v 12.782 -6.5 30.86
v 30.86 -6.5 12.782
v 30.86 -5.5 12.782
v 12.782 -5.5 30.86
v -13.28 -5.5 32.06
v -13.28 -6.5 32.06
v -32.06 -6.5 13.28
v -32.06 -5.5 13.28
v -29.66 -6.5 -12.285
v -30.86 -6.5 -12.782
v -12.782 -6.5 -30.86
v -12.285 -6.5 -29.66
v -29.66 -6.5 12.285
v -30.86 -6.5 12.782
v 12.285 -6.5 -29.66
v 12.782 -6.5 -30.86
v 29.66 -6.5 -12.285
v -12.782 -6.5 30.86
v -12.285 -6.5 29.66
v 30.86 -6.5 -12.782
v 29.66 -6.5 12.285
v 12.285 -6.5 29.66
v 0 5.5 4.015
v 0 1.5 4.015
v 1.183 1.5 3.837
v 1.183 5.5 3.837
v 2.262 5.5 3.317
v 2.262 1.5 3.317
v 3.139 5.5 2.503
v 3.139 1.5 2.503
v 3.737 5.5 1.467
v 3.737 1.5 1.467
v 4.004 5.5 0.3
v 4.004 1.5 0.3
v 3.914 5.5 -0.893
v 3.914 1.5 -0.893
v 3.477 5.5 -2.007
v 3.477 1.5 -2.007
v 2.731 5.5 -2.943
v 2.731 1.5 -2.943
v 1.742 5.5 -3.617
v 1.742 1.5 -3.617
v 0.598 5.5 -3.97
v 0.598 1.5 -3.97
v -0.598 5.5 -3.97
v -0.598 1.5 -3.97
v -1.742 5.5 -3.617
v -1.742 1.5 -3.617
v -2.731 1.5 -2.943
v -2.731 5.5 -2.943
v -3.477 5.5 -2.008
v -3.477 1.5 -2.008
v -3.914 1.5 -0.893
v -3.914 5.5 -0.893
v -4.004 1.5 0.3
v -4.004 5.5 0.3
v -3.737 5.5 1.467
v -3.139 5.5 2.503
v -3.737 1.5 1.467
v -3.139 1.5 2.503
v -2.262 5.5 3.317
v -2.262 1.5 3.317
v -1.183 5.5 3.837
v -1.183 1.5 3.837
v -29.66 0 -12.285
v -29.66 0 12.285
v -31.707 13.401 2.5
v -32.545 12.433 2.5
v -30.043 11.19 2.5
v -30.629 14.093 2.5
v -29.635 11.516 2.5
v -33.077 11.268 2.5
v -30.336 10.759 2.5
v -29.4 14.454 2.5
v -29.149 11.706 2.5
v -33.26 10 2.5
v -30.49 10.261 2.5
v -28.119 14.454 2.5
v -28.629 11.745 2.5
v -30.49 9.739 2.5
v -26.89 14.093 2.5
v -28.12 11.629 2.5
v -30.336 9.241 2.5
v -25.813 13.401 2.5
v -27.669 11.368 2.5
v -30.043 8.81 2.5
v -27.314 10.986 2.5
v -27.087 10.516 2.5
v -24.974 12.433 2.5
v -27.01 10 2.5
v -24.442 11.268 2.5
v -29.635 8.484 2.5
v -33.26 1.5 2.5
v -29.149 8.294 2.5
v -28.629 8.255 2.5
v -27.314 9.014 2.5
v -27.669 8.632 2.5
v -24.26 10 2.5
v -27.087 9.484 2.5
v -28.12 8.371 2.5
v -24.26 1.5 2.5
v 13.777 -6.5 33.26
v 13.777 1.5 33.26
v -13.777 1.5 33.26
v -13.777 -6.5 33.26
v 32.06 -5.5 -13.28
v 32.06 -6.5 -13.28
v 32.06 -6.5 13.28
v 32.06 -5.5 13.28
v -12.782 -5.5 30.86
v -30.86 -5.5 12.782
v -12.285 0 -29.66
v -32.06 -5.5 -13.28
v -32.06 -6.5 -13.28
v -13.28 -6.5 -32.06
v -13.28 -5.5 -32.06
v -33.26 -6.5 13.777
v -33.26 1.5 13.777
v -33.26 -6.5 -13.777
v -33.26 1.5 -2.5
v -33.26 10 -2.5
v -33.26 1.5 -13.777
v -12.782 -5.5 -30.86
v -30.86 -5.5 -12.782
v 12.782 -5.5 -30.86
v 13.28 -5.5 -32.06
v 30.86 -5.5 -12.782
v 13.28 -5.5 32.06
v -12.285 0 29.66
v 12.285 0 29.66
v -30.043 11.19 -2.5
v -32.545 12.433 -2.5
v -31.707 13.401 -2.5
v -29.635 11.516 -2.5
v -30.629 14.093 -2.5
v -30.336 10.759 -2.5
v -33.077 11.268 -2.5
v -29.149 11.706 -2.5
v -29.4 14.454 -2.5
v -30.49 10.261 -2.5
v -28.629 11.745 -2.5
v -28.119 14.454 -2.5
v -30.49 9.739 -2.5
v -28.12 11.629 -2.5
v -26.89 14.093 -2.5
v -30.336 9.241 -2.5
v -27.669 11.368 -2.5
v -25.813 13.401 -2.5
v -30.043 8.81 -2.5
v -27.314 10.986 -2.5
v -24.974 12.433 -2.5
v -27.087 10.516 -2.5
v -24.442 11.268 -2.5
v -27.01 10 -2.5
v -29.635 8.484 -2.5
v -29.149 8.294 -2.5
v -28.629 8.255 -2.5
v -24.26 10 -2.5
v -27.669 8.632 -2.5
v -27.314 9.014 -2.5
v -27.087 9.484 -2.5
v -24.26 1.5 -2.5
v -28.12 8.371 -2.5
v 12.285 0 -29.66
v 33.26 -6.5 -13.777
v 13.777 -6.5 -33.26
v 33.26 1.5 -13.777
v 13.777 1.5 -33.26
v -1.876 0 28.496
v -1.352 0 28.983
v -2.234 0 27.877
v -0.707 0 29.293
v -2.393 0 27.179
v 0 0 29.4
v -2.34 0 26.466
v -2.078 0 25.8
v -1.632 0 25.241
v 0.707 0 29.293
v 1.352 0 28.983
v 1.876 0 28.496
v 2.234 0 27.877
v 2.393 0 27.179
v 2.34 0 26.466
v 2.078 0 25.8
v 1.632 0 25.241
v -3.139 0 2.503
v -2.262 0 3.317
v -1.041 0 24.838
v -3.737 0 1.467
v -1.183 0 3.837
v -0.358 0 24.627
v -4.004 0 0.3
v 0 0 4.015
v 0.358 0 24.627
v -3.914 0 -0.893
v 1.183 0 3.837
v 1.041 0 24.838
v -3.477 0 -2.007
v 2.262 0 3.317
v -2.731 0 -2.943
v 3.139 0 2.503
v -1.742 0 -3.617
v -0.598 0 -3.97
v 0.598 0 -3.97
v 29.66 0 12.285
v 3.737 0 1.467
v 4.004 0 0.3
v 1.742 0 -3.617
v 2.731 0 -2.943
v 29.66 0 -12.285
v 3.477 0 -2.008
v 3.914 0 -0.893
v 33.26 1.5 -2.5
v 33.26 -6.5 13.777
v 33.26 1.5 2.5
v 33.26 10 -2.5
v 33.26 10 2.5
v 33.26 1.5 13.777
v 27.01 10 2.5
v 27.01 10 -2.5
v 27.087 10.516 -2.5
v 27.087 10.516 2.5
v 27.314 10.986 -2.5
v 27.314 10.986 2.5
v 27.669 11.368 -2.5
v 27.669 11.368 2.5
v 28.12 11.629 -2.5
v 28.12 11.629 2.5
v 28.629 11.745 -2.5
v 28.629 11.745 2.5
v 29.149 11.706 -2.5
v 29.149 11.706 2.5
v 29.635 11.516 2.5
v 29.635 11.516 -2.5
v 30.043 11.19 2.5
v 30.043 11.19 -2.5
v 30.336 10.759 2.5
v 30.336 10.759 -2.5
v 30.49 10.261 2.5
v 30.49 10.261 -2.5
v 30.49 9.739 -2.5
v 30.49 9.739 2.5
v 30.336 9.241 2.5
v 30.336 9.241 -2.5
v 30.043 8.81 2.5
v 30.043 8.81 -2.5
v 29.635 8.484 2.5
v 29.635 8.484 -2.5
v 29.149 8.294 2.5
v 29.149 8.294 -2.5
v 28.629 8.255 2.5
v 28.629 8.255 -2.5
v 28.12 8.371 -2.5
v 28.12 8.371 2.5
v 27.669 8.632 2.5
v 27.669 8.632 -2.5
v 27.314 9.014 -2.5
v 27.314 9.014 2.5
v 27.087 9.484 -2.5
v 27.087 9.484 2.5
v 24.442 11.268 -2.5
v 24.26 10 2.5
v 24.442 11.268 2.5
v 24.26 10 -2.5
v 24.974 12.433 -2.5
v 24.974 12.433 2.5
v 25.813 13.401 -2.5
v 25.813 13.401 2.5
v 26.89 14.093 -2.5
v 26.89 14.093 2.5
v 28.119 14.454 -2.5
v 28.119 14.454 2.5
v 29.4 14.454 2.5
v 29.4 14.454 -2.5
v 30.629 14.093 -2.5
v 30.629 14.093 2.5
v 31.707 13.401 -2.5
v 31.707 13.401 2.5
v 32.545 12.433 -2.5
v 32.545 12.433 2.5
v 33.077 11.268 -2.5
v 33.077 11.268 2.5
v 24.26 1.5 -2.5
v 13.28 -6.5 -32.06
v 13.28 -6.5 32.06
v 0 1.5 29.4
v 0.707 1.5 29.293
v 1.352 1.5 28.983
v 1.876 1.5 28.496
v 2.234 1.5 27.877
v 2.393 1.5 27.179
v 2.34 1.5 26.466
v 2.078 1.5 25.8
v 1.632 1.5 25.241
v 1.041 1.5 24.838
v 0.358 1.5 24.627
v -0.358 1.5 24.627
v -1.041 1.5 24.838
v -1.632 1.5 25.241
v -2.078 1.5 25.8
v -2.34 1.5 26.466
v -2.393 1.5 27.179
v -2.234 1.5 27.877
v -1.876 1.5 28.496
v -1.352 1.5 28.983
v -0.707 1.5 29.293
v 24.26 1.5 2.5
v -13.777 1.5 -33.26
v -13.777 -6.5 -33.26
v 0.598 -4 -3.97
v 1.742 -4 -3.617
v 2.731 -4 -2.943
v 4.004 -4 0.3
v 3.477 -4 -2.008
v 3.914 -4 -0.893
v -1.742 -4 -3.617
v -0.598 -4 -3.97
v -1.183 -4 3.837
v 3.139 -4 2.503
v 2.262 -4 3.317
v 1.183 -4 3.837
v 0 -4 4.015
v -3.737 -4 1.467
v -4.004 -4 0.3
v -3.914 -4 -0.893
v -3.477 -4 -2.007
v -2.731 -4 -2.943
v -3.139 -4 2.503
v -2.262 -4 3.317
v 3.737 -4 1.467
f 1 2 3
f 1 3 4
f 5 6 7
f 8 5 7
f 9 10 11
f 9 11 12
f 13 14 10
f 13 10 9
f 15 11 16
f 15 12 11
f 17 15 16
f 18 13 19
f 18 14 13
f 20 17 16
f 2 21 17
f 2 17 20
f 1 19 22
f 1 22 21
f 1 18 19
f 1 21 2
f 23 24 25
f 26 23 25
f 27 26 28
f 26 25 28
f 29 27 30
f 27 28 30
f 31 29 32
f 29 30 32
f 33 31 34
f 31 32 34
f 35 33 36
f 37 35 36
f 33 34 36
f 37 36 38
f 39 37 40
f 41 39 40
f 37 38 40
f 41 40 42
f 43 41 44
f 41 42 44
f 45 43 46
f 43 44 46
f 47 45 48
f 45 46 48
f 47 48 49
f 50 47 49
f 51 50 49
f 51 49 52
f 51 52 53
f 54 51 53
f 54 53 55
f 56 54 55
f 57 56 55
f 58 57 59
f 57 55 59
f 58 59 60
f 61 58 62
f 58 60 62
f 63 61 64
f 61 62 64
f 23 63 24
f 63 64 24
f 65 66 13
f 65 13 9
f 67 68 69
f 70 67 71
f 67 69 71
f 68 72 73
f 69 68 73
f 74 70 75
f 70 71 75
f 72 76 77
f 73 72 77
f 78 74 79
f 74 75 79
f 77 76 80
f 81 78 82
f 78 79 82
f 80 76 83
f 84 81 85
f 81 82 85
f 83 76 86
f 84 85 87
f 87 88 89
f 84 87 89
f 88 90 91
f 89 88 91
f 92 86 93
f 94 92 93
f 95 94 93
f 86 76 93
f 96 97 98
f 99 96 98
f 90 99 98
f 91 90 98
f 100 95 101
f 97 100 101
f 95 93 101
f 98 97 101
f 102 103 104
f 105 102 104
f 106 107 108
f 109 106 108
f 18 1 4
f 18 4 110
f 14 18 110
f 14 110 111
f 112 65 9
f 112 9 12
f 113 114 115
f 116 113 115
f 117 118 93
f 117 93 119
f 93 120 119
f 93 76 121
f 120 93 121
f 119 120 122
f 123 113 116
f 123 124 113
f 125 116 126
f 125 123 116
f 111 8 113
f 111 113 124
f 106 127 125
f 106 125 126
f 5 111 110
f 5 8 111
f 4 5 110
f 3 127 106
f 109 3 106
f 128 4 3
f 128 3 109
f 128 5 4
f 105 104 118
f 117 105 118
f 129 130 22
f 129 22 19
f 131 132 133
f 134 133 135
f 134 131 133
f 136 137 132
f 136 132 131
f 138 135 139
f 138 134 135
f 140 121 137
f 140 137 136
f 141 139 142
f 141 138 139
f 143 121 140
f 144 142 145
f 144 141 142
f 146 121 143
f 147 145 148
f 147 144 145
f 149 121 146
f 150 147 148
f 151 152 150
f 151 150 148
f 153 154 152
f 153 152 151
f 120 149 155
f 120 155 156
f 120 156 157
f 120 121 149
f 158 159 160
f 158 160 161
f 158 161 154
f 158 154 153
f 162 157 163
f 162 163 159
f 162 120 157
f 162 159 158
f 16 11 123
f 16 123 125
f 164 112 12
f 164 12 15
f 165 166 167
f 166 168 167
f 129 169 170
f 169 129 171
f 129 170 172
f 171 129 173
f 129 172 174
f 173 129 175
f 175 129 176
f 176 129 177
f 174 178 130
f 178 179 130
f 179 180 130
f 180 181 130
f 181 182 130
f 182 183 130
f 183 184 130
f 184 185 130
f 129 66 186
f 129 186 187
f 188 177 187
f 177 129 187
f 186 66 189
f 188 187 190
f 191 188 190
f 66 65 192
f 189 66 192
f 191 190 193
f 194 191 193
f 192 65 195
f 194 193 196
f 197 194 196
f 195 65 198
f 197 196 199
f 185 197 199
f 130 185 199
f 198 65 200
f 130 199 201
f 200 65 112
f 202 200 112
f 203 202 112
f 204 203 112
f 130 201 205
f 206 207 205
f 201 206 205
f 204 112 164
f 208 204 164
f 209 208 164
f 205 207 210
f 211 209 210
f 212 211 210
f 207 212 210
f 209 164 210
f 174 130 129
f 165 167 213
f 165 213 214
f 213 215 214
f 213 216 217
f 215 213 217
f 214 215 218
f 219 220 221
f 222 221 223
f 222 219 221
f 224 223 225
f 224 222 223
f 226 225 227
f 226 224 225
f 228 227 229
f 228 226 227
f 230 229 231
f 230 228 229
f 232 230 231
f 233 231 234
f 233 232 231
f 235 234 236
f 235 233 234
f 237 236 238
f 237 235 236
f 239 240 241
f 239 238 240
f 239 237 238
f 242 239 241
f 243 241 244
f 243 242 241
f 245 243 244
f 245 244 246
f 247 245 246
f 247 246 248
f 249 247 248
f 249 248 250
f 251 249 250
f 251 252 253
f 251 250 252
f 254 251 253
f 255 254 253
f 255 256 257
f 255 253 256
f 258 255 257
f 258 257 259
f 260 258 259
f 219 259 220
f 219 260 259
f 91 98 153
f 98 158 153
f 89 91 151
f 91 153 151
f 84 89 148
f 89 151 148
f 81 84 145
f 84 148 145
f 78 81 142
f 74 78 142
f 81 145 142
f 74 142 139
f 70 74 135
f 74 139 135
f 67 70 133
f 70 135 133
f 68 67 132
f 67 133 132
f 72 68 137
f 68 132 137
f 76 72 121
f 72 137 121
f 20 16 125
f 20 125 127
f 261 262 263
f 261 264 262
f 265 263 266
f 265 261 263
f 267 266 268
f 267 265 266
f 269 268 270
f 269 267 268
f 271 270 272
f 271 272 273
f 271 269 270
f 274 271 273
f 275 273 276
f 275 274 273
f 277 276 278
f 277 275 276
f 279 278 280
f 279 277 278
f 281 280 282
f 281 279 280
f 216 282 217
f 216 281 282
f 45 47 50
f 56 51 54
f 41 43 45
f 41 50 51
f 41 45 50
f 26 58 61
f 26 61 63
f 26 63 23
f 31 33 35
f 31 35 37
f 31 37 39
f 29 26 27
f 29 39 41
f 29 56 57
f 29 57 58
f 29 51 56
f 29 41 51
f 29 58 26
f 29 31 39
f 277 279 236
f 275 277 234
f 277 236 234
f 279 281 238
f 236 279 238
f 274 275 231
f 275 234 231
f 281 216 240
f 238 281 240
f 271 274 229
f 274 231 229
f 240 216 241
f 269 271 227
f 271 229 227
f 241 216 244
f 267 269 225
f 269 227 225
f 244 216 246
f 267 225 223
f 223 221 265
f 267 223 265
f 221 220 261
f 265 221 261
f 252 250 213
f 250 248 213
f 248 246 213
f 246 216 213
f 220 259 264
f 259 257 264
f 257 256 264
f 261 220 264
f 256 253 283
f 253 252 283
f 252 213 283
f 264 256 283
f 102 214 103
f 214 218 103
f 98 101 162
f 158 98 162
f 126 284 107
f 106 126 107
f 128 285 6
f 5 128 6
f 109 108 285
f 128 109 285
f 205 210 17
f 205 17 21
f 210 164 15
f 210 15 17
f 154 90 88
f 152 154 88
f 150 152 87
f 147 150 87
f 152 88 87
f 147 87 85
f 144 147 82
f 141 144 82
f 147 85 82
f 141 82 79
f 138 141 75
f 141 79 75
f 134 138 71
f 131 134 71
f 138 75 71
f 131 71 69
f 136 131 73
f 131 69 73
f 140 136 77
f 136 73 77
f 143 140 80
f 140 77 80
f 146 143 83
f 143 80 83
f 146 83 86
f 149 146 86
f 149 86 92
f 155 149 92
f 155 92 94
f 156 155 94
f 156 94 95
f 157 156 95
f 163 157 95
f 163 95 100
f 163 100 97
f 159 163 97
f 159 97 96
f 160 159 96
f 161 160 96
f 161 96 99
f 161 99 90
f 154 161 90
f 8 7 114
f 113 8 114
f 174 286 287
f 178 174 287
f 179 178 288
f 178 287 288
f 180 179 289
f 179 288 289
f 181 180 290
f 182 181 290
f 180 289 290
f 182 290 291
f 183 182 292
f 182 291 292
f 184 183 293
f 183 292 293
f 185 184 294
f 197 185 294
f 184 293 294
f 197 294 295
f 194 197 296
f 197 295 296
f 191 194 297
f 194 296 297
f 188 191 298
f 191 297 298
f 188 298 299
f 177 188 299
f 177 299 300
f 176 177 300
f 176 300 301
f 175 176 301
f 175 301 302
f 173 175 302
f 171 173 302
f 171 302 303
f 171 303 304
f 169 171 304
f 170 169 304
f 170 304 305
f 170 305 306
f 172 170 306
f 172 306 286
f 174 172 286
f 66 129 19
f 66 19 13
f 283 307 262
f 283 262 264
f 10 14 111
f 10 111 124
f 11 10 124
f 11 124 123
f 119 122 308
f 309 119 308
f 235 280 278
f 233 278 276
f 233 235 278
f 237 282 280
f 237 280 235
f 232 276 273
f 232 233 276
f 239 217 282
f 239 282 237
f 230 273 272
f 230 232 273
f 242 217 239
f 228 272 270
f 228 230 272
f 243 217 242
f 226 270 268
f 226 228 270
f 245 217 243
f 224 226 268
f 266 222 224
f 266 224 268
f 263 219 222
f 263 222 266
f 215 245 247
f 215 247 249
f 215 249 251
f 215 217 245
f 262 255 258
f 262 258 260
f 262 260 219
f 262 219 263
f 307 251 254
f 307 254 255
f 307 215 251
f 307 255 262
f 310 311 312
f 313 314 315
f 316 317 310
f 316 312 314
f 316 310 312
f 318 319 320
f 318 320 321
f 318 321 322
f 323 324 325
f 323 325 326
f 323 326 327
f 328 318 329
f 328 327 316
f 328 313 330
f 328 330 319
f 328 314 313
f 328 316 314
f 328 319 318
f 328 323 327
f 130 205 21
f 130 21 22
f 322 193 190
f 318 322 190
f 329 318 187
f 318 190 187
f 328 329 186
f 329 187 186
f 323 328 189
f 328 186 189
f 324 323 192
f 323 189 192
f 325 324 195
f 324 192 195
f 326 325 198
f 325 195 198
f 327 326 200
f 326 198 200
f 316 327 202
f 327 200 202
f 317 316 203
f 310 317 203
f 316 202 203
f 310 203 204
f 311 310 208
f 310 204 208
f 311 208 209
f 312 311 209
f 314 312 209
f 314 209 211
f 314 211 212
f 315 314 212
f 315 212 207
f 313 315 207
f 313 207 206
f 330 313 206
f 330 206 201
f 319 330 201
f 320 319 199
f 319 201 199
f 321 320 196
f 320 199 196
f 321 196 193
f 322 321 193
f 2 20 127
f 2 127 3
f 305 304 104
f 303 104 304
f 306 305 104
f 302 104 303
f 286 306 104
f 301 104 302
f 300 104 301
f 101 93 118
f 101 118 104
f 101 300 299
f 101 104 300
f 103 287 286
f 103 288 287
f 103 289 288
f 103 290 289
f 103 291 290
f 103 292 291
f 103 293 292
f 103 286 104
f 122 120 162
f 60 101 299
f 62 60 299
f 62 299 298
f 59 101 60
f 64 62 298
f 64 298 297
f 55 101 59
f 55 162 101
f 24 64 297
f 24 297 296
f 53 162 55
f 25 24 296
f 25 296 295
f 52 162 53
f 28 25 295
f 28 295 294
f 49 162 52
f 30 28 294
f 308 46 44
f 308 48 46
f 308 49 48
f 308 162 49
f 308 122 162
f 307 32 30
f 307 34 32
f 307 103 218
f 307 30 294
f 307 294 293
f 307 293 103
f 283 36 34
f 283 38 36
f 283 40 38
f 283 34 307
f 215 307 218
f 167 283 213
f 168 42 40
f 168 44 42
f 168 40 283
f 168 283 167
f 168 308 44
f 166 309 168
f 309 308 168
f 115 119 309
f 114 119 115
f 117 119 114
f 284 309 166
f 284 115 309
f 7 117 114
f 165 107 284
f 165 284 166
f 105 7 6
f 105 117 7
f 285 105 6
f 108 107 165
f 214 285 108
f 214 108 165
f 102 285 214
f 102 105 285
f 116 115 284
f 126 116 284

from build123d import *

# Parameters (mm, degrees)
EXTRUDE_1_DEPTH     = 1.5
EXTRUDE_2_DEPTH     = 6.5
CUT_EXTRUDE_1_DEPTH = 1
SKETCH_4_R          = 4.015
EXTRUDE_3_DEPTH     = 4
SKETCH_6_R          = 4.015
EXTRUDE_4_DEPTH     = 4
SKETCH_7_R          = 2.4
CUT_EXTRUDE_3_DEPTH = 48.711742668
SKETCH_8_W          = 9
SKETCH_8_H          = 5
EXTRUDE_5_DEPTH     = 8.5
SKETCH_9_W          = 4.5
SKETCH_9_H          = 5
SKETCH_10_R         = 1.75
CUT_EXTRUDE_4_DEPTH = 51.943190951


with BuildPart() as part:
    # 스케치1 → 보스-돌출1 (new body)
    with BuildSketch(Plane(origin=(0, 0, 0), x_dir=(1, 0, 0), z_dir=(0, 1, 0))):
        Polygon((13.776603565, 33.25966317), (-13.776603565, 33.25966317), (-33.25966317, 13.776603565), (-33.25966317, -13.776603565), (-13.776603565, -33.25966317), (13.776603565, -33.25966317), (33.25966317, -13.776603565), (33.25966317, 13.776603565), align=None)
        Polygon((-13.27954729, 32.05966317), (-32.05966317, 13.27954729), (-32.05966317, -13.27954729), (-13.27954729, -32.05966317), (13.27954729, -32.05966317), (32.05966317, -13.27954729), (32.05966317, 13.27954729), (13.27954729, 32.05966317), align=None, mode=Mode.SUBTRACT)
        Polygon((13.27954729, 32.05966317), (-13.27954729, 32.05966317), (-32.05966317, 13.27954729), (-32.05966317, -13.27954729), (-13.27954729, -32.05966317), (13.27954729, -32.05966317), (32.05966317, -13.27954729), (32.05966317, 13.27954729), align=None)
    extrude(amount=EXTRUDE_1_DEPTH)

    # 스케치2 → 보스-돌출2 (add)
    with BuildSketch(Plane.XZ):
        Polygon((-33.25966317, -13.776603565), (-13.776603565, -33.25966317), (13.776603565, -33.25966317), (33.25966317, -13.776603565), (33.25966317, 13.776603565), (13.776603565, 33.25966317), (-13.776603565, 33.25966317), (-33.25966317, 13.776603565), align=None)
        Polygon((-32.05966317, -13.27954729), (-13.27954729, -32.05966317), (13.27954729, -32.05966317), (32.05966317, -13.27954729), (32.05966317, 13.27954729), (13.27954729, 32.05966317), (-13.27954729, 32.05966317), (-32.05966317, 13.27954729), align=None, mode=Mode.SUBTRACT)
        Polygon((-32.05966317, 13.27954729), (-32.05966317, -13.27954729), (-13.27954729, -32.05966317), (13.27954729, -32.05966317), (32.05966317, -13.27954729), (32.05966317, 13.27954729), (13.27954729, 32.05966317), (-13.27954729, 32.05966317), align=None)
        Polygon((-30.85966317, -12.782491015), (-12.782491015, -30.85966317), (12.782491015, -30.85966317), (30.85966317, -12.782491015), (30.85966317, 12.782491015), (12.782491015, 30.85966317), (-12.782491015, 30.85966317), (-30.85966317, 12.782491015), align=None, mode=Mode.SUBTRACT)
        Polygon((-30.85966317, 12.782491015), (-30.85966317, -12.782491015), (-12.782491015, -30.85966317), (12.782491015, -30.85966317), (30.85966317, -12.782491015), (30.85966317, 12.782491015), (12.782491015, 30.85966317), (-12.782491015, 30.85966317), align=None)
        Polygon((-29.65966317, -12.285434741), (-12.285434741, -29.65966317), (12.285434741, -29.65966317), (29.65966317, -12.285434741), (29.65966317, 12.285434741), (12.285434741, 29.65966317), (-12.285434741, 29.65966317), (-29.65966317, 12.285434741), align=None, mode=Mode.SUBTRACT)
    extrude(amount=EXTRUDE_2_DEPTH)

    # 스케치3 → 컷-돌출1 (cut)
    with BuildSketch(Plane.XZ.offset(6.5)):
        Polygon((-32.05966317, -13.27954729), (-13.27954729, -32.05966317), (13.27954729, -32.05966317), (32.05966317, -13.27954729), (32.05966317, 13.27954729), (13.27954729, 32.05966317), (-13.27954729, 32.05966317), (-32.05966317, 13.27954729), align=None)
        Polygon((-30.85966317, -12.782491015), (-12.782491015, -30.85966317), (12.782491015, -30.85966317), (30.85966317, -12.782491015), (30.85966317, 12.782491015), (12.782491015, 30.85966317), (-12.782491015, 30.85966317), (-30.85966317, 12.782491015), align=None, mode=Mode.SUBTRACT)
    extrude(amount=-CUT_EXTRUDE_1_DEPTH, mode=Mode.SUBTRACT)

    # 스케치4 → 보스-돌출3 (add)
    with BuildSketch(Plane(origin=(0, 1.5, 0), x_dir=(1, 0, 0), z_dir=(0, 1, 0))):
        with Locations(Location((0, 0, 0), (0, 0, 270))):
            Circle(SKETCH_4_R)
    extrude(amount=EXTRUDE_3_DEPTH)

    # 스케치6 → 보스-돌출4 (add)
    with BuildSketch(Plane.XZ):
        with Locations(Location((0, 0, 0), (0, 0, 90))):
            Circle(SKETCH_6_R)
    extrude(amount=EXTRUDE_4_DEPTH)

    # 스케치7 → 컷-돌출3 (cut, through all)
    with BuildSketch(Plane(origin=(0, 1.5, 0), x_dir=(1, 0, 0), z_dir=(0, 1, 0))):
        with Locations(Location((0, -27, 0), (0, 0, 270))):
            Circle(SKETCH_7_R)
    extrude(amount=-CUT_EXTRUDE_3_DEPTH, mode=Mode.SUBTRACT)

    # 스케치8 → 보스-돌출5 (add)
    with BuildSketch(Plane(origin=(0, 1.5, 0), x_dir=(1, 0, 0), z_dir=(0, 1, 0))):
        with Locations((-28.75966317, 0)):
            Rectangle(SKETCH_8_W, SKETCH_8_H)
    extrude_5 = extrude(amount=EXTRUDE_5_DEPTH)

    # 스케치9 → 회전1 (revolve)
    with BuildSketch(Plane(origin=(0, 10, 0), x_dir=(1, 0, 0), z_dir=(0, 1, 0))):
        with Locations((-31.00966317, 0)):
            Rectangle(SKETCH_9_W, SKETCH_9_H)
    revolve_1 = revolve(axis=Axis((-28.75966317, 10, -5.508751215), (0, 0, 1)))

    # 스케치10 → 컷-돌출4 (cut, through all)
    with BuildSketch(Plane.XY.offset(2.5)):
        with Locations((-28.75966317, 10)):
            Circle(SKETCH_10_R)
    cut_extrude_4 = extrude(amount=-CUT_EXTRUDE_4_DEPTH, mode=Mode.SUBTRACT)

    # 대칭 복사1: 보스-돌출5, 회전1, 컷-돌출4 across plane
    add(extrude_5.mirror(Plane(origin=(0, 0, 0), x_dir=(0, 0, 1), z_dir=(1, 0, 0))))
    add(revolve_1.mirror(Plane(origin=(0, 0, 0), x_dir=(0, 0, 1), z_dir=(1, 0, 0))))
    add(cut_extrude_4.mirror(Plane(origin=(0, 0, 0), x_dir=(0, 0, 1), z_dir=(1, 0, 0))), mode=Mode.SUBTRACT)


solid = part.part
